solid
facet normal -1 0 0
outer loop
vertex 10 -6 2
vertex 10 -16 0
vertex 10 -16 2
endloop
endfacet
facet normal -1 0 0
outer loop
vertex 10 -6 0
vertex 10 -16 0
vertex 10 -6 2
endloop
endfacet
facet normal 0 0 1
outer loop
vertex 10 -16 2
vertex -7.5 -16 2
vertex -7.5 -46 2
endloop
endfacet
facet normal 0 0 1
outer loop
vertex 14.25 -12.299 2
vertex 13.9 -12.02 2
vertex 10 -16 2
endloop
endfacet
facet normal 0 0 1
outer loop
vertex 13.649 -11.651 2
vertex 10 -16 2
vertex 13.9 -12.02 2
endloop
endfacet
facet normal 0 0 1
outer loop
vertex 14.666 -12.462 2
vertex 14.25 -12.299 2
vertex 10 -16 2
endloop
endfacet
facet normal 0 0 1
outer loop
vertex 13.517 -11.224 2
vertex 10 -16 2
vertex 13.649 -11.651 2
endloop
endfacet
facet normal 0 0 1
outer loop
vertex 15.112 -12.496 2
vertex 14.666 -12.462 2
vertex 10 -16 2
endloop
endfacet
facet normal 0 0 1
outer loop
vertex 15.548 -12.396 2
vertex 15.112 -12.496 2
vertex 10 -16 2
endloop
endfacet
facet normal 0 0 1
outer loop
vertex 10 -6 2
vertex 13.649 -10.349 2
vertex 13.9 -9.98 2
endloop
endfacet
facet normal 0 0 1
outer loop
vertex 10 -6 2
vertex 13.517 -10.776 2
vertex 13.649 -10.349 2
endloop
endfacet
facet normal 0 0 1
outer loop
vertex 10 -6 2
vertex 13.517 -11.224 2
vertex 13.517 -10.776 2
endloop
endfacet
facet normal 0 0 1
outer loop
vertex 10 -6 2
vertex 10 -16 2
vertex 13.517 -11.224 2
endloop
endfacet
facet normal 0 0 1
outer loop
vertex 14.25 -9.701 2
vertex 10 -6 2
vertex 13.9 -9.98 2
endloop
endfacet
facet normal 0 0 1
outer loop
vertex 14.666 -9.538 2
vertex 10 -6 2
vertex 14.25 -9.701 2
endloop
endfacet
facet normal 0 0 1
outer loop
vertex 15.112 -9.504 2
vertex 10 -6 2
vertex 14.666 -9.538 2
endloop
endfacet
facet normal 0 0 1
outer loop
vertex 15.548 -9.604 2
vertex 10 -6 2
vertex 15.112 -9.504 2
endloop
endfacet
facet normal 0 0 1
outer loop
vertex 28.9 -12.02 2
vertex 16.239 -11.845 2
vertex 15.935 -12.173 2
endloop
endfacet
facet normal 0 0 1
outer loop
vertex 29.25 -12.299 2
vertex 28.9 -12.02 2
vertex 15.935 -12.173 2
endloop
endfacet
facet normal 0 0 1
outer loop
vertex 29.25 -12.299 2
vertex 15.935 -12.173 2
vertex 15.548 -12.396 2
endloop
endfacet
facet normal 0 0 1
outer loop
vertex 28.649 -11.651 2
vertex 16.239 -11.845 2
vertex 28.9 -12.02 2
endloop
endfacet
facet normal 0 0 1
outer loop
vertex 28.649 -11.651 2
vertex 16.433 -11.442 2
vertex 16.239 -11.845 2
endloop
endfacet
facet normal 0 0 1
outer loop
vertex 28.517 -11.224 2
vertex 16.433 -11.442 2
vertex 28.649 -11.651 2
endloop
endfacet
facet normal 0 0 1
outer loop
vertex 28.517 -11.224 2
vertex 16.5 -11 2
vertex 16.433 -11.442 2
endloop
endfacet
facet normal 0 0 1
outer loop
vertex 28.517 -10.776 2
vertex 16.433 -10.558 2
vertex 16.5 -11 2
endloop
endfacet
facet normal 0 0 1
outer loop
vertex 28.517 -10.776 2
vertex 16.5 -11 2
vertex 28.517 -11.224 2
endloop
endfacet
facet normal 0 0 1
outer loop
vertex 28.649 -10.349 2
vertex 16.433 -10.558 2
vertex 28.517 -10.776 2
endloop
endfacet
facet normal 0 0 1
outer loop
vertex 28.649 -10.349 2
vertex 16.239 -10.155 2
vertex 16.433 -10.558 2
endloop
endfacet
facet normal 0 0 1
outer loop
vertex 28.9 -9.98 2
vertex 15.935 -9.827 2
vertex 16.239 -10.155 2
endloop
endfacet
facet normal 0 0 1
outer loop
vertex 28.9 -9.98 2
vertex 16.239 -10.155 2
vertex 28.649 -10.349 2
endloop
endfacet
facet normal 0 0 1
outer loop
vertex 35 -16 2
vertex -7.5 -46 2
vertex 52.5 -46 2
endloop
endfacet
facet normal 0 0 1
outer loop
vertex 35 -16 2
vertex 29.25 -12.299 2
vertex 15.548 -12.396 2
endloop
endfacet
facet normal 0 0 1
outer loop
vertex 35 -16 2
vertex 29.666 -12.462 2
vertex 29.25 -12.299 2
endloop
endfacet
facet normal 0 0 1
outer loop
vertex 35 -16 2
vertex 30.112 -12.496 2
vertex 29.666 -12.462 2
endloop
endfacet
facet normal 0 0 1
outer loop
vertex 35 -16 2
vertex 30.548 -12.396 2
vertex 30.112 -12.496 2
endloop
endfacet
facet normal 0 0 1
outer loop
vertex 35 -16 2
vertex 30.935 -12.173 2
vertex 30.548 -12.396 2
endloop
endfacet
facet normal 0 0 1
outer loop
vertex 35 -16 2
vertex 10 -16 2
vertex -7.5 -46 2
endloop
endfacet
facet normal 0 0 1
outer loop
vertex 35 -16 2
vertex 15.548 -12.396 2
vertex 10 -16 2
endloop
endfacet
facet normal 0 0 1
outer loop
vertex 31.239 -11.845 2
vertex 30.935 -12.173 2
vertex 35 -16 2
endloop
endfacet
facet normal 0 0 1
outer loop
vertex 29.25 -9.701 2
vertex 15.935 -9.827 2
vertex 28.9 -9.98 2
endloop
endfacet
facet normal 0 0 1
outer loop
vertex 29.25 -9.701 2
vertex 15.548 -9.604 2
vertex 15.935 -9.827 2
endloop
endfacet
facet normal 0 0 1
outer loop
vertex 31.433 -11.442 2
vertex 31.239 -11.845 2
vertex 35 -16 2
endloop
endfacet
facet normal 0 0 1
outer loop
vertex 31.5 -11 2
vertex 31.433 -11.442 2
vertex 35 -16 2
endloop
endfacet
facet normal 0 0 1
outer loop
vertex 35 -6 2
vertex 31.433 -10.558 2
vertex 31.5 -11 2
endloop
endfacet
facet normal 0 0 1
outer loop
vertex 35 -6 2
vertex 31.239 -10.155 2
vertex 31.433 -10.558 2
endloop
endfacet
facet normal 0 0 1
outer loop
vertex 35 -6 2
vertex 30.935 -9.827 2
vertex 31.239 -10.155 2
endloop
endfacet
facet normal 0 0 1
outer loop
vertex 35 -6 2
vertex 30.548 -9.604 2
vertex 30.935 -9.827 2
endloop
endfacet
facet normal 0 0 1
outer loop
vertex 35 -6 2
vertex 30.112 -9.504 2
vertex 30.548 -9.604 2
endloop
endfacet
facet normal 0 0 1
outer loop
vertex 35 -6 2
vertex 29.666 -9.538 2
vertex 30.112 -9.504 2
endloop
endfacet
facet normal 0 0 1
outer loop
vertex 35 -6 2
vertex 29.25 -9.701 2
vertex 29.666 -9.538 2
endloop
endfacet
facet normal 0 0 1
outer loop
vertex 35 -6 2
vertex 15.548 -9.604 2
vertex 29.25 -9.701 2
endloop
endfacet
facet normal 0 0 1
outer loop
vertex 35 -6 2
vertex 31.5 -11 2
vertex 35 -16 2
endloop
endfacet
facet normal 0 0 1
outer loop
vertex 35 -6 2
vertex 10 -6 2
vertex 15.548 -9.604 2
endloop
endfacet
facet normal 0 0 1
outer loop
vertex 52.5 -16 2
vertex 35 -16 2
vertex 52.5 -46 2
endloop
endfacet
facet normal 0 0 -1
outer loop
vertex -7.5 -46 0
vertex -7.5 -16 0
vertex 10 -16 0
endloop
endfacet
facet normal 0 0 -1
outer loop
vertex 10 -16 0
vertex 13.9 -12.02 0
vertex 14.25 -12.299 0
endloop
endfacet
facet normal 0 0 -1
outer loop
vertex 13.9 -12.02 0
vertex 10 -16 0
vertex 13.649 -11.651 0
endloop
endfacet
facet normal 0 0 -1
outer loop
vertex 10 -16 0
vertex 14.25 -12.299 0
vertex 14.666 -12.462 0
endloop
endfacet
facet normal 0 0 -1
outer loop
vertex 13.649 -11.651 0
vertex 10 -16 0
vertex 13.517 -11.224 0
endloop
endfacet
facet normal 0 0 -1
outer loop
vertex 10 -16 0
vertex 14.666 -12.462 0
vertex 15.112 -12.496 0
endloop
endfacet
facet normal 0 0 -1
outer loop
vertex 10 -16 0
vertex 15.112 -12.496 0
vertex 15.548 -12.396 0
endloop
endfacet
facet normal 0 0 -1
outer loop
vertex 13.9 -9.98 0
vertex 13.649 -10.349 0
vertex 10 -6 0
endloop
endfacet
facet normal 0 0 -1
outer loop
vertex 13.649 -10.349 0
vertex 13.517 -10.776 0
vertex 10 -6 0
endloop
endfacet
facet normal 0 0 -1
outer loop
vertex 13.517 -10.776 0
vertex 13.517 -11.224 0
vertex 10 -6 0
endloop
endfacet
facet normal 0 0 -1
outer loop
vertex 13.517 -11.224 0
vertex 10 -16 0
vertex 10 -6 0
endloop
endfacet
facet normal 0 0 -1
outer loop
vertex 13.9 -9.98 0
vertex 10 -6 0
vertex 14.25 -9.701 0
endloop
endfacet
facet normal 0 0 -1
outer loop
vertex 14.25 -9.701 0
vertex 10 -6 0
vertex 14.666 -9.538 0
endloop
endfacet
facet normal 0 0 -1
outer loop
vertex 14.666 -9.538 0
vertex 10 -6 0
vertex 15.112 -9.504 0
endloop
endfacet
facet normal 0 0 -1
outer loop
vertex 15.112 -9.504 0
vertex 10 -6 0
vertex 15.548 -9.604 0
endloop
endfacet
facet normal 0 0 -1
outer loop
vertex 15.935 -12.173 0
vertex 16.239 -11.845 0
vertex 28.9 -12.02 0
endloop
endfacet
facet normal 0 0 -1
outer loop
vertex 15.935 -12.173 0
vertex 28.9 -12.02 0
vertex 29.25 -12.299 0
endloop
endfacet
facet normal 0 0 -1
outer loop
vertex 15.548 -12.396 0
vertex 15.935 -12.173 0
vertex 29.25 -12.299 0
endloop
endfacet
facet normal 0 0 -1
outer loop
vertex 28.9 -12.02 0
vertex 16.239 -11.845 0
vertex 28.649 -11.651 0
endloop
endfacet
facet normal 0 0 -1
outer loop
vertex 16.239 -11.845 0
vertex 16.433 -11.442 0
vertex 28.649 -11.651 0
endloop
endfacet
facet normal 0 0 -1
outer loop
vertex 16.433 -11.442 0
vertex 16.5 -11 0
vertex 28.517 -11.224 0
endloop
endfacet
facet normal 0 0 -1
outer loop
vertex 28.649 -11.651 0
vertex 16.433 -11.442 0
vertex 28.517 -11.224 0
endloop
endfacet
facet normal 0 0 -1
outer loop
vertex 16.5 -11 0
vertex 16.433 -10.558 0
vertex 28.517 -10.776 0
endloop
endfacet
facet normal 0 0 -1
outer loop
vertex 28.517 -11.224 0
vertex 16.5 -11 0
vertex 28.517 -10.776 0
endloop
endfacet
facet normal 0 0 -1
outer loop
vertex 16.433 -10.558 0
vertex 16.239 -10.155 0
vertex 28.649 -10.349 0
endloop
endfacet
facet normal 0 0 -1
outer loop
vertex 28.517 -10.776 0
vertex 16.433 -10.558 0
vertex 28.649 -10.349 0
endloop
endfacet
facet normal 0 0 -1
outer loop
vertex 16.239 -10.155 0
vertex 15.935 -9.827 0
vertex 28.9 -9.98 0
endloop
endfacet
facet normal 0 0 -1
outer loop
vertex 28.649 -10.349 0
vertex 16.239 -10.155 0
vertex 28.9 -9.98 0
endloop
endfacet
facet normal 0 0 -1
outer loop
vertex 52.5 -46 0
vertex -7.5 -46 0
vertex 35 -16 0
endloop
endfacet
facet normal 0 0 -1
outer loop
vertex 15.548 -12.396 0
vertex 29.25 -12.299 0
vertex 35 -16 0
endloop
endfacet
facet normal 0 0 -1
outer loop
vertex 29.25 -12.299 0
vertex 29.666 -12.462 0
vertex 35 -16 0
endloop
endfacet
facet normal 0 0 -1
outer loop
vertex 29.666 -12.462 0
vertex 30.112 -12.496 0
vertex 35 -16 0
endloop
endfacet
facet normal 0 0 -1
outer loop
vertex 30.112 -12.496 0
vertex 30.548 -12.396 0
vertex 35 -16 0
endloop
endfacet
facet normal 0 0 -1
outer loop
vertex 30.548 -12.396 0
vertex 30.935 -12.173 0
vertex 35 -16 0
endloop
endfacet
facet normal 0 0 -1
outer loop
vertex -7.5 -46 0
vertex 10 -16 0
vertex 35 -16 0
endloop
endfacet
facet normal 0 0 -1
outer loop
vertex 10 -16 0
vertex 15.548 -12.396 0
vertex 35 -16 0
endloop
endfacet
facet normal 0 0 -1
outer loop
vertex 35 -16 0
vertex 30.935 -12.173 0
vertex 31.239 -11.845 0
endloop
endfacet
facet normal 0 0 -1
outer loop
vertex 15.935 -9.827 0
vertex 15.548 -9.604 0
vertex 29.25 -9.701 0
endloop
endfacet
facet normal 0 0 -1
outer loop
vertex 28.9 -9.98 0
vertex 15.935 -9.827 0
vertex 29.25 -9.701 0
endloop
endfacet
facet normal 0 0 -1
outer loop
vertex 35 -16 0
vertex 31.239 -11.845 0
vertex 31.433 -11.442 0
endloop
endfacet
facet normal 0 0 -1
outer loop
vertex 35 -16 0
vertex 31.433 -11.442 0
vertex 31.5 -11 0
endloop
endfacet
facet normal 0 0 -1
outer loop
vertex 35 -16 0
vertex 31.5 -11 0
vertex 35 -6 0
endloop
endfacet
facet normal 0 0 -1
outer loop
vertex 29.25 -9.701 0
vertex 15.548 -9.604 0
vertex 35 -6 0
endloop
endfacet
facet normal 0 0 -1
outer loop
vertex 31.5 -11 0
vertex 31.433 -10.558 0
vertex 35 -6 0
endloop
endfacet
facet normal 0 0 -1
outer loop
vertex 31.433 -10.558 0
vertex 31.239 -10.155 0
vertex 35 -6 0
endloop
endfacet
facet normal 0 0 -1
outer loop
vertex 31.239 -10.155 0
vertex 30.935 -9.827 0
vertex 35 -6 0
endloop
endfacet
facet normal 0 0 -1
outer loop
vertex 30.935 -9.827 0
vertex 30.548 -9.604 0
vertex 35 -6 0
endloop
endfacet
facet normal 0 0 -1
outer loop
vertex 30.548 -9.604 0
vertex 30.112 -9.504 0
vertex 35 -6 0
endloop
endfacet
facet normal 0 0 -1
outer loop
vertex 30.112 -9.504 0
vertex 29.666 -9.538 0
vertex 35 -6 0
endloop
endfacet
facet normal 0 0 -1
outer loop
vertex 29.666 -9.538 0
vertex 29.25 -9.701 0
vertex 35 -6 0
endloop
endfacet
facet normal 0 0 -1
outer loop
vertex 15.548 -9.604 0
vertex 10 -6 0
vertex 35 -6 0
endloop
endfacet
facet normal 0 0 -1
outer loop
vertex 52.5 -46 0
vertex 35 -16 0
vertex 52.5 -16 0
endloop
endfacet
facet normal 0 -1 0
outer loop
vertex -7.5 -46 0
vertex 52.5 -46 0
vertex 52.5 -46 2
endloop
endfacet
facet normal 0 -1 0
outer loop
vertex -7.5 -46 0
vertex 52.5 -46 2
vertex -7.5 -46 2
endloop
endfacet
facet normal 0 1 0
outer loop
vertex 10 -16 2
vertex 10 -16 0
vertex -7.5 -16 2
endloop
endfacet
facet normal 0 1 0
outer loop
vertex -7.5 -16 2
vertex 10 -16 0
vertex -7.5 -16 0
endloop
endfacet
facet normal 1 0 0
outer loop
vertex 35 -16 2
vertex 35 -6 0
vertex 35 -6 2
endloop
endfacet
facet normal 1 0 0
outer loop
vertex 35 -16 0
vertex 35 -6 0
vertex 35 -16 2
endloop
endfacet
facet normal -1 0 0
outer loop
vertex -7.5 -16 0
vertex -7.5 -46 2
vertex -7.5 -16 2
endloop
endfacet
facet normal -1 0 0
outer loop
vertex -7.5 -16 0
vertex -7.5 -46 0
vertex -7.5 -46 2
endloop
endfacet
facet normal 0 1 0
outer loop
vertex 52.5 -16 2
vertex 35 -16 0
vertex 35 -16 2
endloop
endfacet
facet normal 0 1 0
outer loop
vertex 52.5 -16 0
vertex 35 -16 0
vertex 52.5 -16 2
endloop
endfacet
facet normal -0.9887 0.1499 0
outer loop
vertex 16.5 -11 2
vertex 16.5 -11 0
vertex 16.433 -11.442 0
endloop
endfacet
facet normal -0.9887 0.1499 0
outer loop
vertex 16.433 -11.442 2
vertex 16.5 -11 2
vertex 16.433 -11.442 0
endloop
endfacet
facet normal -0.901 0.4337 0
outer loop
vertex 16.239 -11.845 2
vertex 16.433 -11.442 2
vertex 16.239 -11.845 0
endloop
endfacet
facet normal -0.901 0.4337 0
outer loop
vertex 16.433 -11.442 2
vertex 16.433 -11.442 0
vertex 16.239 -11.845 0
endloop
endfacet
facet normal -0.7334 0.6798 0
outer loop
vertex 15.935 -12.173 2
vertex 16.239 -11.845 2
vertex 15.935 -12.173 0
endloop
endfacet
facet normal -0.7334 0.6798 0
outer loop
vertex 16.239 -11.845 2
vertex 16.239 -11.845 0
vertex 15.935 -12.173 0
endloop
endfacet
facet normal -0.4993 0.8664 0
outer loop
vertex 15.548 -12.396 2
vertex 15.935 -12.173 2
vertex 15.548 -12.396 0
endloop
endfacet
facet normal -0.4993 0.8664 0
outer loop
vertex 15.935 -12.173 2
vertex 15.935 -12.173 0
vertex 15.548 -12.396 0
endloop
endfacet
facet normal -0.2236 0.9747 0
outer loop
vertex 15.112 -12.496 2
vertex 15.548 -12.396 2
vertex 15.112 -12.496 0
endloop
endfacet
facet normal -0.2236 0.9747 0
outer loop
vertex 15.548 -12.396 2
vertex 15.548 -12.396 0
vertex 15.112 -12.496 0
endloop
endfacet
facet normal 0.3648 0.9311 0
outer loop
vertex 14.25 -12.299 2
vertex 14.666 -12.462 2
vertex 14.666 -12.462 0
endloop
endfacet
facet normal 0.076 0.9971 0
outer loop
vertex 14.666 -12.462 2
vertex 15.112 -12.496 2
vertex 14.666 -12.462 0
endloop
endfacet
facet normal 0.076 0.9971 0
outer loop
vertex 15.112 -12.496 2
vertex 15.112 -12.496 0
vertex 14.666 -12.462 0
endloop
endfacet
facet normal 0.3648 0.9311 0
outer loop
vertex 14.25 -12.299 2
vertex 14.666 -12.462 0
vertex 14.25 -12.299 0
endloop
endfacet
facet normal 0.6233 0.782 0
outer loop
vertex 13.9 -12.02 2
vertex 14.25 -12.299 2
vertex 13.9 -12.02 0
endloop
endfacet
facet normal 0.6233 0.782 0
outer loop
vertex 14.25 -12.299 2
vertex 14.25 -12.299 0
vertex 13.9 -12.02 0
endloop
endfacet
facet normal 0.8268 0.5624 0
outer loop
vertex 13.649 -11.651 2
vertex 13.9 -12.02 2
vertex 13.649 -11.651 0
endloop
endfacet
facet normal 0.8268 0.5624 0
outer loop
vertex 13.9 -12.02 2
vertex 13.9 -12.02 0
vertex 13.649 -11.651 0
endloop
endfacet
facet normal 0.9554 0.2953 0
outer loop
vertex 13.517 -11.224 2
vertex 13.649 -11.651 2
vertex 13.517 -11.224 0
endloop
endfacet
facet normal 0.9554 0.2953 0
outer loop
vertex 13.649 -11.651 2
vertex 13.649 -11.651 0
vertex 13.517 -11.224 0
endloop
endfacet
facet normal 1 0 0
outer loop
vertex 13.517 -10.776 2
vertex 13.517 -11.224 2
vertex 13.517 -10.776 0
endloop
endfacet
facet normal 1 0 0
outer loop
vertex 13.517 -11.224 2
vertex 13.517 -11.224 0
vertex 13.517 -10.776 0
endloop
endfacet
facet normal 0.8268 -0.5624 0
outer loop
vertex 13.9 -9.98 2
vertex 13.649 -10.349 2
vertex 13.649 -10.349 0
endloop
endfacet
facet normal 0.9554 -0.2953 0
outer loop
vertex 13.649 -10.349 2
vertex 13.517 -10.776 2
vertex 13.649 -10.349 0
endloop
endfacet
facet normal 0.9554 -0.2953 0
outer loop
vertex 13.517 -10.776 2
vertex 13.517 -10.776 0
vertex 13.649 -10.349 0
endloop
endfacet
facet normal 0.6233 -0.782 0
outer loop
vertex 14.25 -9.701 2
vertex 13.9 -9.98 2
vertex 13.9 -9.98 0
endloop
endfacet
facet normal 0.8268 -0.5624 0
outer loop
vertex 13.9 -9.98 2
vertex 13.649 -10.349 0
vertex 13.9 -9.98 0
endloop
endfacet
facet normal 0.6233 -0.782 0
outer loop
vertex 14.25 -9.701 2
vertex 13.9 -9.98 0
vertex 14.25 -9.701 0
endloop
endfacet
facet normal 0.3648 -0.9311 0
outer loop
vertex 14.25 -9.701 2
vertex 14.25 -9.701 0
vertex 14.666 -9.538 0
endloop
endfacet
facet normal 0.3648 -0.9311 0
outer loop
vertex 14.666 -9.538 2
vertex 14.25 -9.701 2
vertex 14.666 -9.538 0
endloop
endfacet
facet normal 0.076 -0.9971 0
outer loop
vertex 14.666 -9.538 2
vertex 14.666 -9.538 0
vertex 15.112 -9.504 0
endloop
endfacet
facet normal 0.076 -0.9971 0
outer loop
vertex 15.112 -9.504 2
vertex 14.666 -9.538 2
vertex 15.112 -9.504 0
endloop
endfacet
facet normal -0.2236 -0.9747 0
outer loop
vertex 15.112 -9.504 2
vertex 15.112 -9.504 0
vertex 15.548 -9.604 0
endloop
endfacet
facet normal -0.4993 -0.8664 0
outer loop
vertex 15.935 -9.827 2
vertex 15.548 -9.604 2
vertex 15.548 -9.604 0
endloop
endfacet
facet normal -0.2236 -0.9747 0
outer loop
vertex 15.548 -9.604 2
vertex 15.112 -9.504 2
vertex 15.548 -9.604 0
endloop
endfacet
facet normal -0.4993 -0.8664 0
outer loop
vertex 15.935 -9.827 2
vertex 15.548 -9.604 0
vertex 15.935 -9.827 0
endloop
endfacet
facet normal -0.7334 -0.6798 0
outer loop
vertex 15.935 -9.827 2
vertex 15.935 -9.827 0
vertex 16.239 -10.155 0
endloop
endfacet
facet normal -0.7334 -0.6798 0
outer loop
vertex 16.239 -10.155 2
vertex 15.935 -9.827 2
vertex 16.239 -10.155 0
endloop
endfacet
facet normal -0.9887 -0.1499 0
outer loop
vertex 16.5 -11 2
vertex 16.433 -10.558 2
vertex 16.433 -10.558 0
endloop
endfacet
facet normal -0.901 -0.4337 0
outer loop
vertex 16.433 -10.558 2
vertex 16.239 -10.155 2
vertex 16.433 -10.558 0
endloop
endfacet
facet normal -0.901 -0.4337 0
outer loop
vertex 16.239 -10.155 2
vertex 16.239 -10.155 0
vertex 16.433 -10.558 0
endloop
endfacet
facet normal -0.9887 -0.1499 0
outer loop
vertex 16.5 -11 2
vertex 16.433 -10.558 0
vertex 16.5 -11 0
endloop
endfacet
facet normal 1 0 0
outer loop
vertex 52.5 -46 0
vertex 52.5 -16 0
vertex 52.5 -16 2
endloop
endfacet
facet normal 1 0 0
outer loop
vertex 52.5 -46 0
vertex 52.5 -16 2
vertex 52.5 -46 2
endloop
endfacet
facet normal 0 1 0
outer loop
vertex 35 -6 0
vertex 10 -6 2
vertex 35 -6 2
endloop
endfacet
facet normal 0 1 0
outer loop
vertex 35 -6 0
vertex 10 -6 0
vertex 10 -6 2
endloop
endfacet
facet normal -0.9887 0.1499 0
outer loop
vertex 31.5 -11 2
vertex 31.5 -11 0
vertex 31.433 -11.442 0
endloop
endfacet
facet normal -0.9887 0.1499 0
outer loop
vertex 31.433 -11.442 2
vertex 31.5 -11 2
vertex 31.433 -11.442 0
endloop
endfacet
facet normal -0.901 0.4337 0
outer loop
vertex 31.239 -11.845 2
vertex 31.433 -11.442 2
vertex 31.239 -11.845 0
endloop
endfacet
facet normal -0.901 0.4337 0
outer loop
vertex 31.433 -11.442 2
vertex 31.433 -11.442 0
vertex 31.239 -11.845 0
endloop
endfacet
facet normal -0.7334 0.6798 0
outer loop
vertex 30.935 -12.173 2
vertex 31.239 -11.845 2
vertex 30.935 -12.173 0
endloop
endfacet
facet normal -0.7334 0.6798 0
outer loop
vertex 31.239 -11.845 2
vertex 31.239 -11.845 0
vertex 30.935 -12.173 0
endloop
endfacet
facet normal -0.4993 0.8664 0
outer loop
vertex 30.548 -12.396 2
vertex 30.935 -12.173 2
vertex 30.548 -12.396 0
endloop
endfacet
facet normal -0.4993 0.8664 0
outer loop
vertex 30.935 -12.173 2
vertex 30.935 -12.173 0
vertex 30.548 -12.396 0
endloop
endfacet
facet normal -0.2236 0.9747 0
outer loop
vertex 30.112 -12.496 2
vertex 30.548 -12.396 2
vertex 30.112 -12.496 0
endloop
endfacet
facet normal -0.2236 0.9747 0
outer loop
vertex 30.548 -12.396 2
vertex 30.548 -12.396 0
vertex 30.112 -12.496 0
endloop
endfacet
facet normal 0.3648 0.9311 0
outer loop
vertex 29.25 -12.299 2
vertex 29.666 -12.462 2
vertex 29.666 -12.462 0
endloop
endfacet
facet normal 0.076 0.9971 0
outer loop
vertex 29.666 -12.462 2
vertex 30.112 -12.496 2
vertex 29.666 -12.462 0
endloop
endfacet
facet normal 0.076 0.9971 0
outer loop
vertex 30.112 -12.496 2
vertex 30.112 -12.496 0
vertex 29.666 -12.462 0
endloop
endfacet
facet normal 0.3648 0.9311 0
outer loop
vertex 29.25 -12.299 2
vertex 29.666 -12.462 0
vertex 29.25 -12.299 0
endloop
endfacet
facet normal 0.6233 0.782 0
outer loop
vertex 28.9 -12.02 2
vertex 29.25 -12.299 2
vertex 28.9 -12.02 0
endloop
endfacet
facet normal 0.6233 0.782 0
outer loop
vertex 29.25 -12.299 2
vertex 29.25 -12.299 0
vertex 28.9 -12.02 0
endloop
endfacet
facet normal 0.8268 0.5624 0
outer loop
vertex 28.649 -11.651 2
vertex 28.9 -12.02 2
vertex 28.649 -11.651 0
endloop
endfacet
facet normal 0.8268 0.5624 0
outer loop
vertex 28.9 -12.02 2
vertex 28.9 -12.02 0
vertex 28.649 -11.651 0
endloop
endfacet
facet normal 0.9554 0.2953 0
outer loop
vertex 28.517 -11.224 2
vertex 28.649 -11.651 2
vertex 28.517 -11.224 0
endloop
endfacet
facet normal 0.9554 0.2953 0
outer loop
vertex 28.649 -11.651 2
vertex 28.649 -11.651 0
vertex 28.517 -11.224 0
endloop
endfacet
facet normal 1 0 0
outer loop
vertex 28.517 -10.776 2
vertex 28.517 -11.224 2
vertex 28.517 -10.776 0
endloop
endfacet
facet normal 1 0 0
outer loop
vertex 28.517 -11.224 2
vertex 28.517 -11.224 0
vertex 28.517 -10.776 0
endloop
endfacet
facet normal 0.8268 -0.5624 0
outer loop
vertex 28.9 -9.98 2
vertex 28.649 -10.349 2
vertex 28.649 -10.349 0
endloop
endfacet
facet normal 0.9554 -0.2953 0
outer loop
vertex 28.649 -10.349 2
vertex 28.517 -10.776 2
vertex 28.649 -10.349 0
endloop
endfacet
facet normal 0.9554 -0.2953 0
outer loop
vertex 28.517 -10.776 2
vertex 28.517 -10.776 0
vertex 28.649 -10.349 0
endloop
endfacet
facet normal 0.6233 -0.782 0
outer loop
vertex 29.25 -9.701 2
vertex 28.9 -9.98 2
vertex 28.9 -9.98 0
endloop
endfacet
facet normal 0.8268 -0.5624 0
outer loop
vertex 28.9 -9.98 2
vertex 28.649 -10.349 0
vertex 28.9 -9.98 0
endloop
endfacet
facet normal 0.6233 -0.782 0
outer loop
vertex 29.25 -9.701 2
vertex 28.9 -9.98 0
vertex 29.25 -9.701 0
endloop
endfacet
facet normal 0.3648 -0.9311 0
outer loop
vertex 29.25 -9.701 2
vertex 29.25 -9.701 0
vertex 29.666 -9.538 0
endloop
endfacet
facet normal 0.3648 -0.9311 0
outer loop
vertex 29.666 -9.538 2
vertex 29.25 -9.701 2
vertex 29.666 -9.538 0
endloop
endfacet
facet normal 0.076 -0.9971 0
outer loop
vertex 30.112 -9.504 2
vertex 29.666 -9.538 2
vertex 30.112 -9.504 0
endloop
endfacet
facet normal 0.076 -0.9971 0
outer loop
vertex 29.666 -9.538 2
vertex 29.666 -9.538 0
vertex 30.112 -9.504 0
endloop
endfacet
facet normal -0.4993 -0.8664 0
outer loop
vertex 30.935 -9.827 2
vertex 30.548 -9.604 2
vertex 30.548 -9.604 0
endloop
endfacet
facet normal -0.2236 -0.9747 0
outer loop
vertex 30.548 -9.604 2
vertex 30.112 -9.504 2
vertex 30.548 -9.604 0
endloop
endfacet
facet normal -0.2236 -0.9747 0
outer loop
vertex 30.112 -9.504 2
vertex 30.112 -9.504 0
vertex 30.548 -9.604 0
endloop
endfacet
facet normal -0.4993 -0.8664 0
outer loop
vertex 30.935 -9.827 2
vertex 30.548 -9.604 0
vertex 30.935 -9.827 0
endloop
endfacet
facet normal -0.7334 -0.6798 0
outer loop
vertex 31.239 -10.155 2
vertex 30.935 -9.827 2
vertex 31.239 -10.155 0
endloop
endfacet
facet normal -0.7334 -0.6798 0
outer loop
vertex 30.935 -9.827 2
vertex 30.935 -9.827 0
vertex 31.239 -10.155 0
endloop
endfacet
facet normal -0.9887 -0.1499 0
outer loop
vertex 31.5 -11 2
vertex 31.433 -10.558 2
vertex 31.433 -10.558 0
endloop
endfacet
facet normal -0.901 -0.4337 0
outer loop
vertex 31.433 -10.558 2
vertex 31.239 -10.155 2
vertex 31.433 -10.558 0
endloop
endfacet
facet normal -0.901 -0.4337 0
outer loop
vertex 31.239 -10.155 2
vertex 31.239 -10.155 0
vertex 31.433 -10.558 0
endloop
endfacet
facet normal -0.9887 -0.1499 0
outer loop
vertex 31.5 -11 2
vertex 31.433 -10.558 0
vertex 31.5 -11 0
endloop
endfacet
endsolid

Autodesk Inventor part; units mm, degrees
ref_plane "YZ Plane" through (0, 0, 0) normal (1, 0, 0) x (0, 1, 0)
ref_plane "XZ Plane" through (0, 0, 0) normal (0, 1, 0) x (-1, 0, 0)
ref_plane "XY Plane" through (0, 0, 0) normal (0, 0, 1) x (1, 0, 0)
ref_plane "Work Plane1" through (0, 0, 0) normal (0, 0, 1) x (1, 0, 0)
sketch "Sketch1" plane through (0, 0, 0) normal (0, 0, 1) x (1, 0, 0)
  circle A0 centre (15, -11) radius 1.5 projected
  circle A1 centre (30, -11) radius 1.5 projected
  line L0 (0, -20) -> (0, 4) construction
  line L1 (0, -20) -> (45, -20) construction
  line L2 (45, -20) -> (45, 4) construction
  line L3 (0, 4) -> (45, 4) construction
  line L4 (15, -11) -> (10, -11) construction
  line L5 (10, -11) -> (10, -6) construction
  line L6 (10, -6) -> (15, -6) construction
  line L7 (15, -6) -> (15, -11) construction
  line L8 (30, -11) -> (35, -11) construction
  line L9 (35, -11) -> (35, -6) construction
  line L10 (35, -6) -> (30, -6) construction
  line L11 (30, -6) -> (30, -11) construction
  line L12 (10, -6) -> (35, -6)
  line L13 (35, -6) -> (35, -16)
  line L14 (35, -16) -> (10, -16)
  line L15 (10, -16) -> (10, -6)
  line L16 (22.5, -16) -> (-7.5, -16)
  line L17 (-7.5, -16) -> (52.5, -16)
  line L18 (52.5, -16) -> (52.5, -46)
  line L19 (52.5, -46) -> (-7.5, -46)
  line L20 (-7.5, -46) -> (-7.5, -16)
  point P0 (0, 0)
  dimension "d0" = 5
  dimension "d1" = 5
  dimension "d2" = 5
  dimension "d3" = 5
  dimension "d4" = 10
  dimension "d5" = 30
  dimension "d6" = 60
  dimension "d7" = 30
extrude "Extrusion1" add sketch "Sketch1" along normal blind 2
properties part number "april_tag_2"
